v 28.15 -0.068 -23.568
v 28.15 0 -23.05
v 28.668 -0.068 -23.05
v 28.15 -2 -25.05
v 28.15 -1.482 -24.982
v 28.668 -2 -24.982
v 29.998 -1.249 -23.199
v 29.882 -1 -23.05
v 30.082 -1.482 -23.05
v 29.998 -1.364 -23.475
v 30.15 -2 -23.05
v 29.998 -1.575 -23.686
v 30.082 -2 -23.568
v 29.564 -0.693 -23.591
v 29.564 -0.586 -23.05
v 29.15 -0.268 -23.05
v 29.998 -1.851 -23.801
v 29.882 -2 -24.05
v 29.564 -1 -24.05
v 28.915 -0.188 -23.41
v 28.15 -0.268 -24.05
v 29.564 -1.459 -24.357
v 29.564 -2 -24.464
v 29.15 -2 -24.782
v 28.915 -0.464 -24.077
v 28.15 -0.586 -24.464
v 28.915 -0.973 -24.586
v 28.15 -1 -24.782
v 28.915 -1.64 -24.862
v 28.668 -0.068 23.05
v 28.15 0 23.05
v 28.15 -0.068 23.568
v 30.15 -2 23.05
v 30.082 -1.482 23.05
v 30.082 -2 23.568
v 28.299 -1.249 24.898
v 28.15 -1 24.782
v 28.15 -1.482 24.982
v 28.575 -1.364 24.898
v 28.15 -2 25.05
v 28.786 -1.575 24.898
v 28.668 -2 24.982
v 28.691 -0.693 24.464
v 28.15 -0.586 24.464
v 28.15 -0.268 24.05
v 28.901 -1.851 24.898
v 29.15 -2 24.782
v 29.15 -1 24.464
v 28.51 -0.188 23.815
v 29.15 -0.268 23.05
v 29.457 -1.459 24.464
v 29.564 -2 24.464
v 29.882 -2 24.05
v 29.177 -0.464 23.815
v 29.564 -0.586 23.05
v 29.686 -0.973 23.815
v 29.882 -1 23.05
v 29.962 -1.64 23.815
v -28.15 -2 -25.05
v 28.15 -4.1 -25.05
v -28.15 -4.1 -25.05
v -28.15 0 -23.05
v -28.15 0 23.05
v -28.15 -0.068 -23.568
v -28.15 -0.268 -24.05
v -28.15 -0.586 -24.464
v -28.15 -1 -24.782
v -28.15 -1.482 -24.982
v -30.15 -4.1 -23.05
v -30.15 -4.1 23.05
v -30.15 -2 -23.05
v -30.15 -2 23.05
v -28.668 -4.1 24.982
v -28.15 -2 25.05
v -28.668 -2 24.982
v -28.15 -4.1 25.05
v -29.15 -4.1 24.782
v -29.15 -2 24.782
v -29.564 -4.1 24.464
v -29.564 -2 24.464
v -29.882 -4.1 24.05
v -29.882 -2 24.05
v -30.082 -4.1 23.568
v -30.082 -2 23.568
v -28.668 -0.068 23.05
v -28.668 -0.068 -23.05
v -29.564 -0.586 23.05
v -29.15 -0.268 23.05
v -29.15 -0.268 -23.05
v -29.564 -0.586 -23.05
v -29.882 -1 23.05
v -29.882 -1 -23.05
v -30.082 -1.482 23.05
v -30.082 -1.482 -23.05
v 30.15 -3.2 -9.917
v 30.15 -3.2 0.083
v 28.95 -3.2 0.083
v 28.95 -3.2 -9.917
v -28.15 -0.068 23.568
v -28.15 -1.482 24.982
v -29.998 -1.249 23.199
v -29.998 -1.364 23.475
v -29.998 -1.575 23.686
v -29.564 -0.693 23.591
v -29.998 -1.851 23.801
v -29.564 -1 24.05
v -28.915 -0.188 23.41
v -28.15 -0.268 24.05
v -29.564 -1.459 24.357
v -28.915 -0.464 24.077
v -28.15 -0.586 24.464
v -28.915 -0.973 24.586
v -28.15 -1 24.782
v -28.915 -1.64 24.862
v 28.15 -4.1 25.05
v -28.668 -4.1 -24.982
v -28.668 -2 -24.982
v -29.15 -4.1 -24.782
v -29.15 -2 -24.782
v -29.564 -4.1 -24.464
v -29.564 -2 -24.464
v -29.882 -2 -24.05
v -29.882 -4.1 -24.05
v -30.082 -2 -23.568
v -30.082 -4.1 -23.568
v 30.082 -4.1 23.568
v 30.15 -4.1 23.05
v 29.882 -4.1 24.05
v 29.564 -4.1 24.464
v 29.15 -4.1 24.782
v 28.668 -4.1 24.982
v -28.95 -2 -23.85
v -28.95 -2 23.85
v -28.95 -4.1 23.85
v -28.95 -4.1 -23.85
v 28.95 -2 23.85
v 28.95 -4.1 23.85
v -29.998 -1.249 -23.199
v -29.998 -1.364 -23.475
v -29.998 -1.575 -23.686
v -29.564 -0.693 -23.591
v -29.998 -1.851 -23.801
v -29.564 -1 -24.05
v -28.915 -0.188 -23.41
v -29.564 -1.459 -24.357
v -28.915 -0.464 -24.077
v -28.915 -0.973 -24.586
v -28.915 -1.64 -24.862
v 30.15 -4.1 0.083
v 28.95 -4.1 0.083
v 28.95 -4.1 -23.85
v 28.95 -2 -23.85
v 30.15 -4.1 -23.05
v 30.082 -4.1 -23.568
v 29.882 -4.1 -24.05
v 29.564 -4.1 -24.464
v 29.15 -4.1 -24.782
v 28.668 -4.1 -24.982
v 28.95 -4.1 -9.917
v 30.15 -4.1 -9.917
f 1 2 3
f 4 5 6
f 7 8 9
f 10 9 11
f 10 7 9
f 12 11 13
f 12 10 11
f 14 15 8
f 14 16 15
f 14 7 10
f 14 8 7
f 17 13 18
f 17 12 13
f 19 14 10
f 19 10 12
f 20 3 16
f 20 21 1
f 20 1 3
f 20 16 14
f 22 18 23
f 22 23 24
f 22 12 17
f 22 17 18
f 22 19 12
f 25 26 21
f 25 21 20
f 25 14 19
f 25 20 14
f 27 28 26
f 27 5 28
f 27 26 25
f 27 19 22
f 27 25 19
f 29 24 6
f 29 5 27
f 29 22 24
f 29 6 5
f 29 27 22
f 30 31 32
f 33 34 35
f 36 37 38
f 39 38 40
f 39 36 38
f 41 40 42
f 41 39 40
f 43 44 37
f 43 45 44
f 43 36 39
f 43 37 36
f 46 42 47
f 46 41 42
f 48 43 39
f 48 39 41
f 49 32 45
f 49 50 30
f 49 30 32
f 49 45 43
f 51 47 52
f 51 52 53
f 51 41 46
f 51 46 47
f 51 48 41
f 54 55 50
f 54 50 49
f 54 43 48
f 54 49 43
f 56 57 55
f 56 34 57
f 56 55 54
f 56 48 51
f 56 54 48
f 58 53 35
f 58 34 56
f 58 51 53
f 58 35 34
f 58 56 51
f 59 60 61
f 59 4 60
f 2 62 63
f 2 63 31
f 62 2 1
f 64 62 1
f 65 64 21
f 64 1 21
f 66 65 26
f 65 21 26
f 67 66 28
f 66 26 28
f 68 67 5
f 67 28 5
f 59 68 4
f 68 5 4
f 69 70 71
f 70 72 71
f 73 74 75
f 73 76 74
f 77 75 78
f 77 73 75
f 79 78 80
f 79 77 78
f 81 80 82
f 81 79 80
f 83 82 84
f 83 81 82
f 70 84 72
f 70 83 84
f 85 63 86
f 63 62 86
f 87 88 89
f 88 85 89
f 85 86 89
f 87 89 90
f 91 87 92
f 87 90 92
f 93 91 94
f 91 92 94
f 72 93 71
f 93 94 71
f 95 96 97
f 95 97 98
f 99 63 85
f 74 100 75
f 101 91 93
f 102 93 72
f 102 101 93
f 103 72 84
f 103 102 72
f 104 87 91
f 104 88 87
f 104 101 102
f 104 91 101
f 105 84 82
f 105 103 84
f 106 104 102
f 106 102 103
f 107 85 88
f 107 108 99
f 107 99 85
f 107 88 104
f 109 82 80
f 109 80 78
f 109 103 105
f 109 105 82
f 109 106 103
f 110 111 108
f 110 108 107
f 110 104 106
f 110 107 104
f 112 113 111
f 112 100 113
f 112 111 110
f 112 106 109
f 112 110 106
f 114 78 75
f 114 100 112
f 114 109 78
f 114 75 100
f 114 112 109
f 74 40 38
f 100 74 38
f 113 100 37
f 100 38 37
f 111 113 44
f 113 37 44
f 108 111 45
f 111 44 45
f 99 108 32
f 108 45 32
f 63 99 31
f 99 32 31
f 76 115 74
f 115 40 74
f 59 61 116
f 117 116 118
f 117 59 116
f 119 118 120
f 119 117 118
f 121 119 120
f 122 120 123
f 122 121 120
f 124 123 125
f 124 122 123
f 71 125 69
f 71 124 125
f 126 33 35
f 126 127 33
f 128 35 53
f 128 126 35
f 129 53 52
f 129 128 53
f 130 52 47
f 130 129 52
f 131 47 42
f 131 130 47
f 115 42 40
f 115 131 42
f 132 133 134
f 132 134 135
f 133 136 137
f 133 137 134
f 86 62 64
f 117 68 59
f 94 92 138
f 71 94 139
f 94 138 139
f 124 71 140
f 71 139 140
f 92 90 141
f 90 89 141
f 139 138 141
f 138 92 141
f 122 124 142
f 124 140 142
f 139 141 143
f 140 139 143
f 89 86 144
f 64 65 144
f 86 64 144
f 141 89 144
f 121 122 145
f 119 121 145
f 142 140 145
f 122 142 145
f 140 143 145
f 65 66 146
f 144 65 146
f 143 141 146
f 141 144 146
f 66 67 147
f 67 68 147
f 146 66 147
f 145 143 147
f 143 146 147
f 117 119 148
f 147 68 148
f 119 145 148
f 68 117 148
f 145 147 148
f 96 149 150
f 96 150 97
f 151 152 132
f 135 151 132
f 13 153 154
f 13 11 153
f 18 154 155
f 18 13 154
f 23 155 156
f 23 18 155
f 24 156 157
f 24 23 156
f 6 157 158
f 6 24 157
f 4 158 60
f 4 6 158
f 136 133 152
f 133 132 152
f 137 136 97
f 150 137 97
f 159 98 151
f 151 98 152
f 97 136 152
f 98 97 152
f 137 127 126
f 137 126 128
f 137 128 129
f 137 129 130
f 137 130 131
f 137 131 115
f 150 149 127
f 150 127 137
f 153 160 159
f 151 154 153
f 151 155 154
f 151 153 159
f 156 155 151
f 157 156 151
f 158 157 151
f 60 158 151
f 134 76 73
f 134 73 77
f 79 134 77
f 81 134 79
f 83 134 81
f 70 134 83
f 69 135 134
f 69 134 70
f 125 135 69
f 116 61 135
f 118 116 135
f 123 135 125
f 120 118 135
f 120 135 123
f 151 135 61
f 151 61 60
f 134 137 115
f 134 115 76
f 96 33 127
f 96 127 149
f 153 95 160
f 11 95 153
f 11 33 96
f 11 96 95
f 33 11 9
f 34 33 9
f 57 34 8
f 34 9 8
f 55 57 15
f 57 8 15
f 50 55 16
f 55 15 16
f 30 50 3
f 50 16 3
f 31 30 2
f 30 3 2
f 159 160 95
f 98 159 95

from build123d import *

# Parameters (mm, degrees)
SKETCH1_W          = 60.3
SKETCH1_H          = 50.1
OUTERWALLS_DEPTH   = 2
SKETCH2_W          = 60.3
SKETCH2_H          = 50.1
SKETCH2_W_2        = 57.9
SKETCH2_H_2        = 47.7
INNER_DEPTH        = 2.1
SKETCH4_W          = 10
SKETCH4_H          = 3.7
CUT_EXTRUDE1_DEPTH = 20
FILLET1_R          = 2


with BuildPart() as part:
    # Sketch1 → OuterWalls (new body)
    with BuildSketch(Plane(origin=(0, 0, 0), x_dir=(1, 0, 0), z_dir=(0, 1, 0))):
        Rectangle(SKETCH1_W, SKETCH1_H)
    extrude(amount=-OUTERWALLS_DEPTH)

    # Sketch2 → Inner (add)
    with BuildSketch(Plane(origin=(0, -2, 0), x_dir=(-1, 0, 0), z_dir=(0, -1, 0))):
        Rectangle(SKETCH2_W, SKETCH2_H)
        Rectangle(SKETCH2_W_2, SKETCH2_H_2, mode=Mode.SUBTRACT)
    extrude(amount=INNER_DEPTH)

    # Sketch4 → Cut-Extrude1 (cut)
    with BuildSketch(Plane(origin=(30.15, 0, 0), x_dir=(0, 0, -1), z_dir=(1, 0, 0))):
        with Locations((4.91675286, -5.05)):
            Rectangle(SKETCH4_W, SKETCH4_H)
    extrude(amount=-CUT_EXTRUDE1_DEPTH, mode=Mode.SUBTRACT)

    # Fillet1
    fillet1_edges = [part.edges().sort_by_distance(p)[0] for p in [
        (0, 0, -25.05),
        (30.15, 0, 0),
        (0, 0, 25.05),
        (-30.15, 0, 0),
        (-30.15, -2.05, -25.05),
        (30.15, -2.05, -25.05),
        (30.15, -2.05, 25.05),
        (-30.15, -2.05, 25.05),
    ]]
    fillet(fillet1_edges, radius=FILLET1_R)


solid = part.part
